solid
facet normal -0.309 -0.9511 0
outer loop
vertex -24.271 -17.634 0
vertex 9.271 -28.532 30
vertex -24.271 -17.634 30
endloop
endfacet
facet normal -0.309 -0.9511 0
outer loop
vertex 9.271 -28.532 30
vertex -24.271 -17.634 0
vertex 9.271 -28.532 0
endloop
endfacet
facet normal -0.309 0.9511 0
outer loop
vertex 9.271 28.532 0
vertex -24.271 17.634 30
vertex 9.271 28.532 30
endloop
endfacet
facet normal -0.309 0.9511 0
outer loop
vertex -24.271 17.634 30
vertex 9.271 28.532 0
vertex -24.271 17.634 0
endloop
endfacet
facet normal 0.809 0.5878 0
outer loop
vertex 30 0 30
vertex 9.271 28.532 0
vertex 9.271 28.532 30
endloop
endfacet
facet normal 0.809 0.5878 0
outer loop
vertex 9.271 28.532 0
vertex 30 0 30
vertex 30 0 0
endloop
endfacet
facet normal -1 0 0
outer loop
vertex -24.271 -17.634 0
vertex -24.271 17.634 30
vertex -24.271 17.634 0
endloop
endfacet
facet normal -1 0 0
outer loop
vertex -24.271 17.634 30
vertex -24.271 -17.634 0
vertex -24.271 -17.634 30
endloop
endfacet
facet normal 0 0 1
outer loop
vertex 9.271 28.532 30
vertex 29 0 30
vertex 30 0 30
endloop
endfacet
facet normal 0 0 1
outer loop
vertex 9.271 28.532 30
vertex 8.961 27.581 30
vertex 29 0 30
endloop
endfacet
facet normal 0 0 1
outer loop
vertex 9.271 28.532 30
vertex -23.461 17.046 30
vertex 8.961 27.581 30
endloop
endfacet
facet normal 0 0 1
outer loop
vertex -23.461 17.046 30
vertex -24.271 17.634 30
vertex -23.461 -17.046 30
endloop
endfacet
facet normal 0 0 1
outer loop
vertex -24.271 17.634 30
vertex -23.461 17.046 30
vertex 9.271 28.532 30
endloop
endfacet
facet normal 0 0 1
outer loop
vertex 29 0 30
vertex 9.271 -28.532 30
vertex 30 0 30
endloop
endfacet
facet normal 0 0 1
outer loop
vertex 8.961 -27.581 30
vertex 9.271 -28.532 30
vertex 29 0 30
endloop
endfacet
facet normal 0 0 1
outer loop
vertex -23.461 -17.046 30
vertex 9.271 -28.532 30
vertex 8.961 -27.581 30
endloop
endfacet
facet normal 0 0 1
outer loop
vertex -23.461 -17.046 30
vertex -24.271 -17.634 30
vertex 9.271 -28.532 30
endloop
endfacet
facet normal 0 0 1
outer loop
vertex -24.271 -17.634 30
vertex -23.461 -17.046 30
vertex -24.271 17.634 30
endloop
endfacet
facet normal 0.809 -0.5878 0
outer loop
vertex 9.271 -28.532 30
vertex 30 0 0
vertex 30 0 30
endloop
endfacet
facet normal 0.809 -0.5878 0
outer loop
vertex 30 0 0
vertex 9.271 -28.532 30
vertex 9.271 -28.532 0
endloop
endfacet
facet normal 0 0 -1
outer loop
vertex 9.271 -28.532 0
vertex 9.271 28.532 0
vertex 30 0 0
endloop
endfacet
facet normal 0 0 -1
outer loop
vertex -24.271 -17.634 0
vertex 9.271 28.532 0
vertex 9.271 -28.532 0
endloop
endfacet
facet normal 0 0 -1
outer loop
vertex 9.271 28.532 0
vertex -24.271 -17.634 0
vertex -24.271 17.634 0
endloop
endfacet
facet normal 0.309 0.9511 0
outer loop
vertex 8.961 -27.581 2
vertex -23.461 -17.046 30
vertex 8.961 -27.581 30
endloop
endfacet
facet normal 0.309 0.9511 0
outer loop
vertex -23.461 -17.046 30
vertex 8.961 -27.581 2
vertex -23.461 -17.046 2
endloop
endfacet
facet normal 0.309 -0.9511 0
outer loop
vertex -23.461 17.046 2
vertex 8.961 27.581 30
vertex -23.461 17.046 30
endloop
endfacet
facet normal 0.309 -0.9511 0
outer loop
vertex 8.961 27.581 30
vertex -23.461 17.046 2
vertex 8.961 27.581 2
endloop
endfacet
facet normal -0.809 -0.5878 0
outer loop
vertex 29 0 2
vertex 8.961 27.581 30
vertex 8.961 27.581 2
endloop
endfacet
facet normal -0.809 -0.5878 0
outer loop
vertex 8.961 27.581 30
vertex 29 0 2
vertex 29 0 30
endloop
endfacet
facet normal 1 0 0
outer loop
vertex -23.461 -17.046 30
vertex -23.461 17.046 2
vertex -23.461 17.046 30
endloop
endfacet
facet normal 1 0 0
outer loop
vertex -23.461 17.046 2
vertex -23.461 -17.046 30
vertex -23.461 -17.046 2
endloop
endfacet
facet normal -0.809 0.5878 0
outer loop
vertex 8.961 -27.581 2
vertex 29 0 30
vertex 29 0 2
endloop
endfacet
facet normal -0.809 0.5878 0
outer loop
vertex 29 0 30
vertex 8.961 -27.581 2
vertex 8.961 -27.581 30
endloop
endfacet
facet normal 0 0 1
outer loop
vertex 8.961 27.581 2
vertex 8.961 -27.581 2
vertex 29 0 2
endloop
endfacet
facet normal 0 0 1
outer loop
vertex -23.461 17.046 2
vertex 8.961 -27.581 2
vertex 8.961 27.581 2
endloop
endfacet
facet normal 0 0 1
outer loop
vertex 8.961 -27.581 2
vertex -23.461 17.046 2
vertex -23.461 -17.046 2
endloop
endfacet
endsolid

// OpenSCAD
// [FL_INDEX: keywords="openscad, 3d_parametric, Parametric_Simple_Cup_or_Vase, csg_solid" | COT="Parametric OpenSCAD design from 3DCodeverse"]
// Title: Parametric Simple Cup or Vase

// Simple Customizable Cup.

// By Donald E. King, 1/8/2013

// Written primarily to check out the Thingiverse.com Customizer feature.

// resolution of circles, cylinders and spheres
1_res = 5;  // [120, 60, 50, 40, 30, 20, 13, 12, 11, 10, 9, 8, 7, 6, 5, 4, 3]

// outside radius of cup
radius_1 = 30;

// height of cup
height_1 = 30;

// wall thickness (negative values produce a disc wthout walls)
t_wall = 1; //  [0.5, 1, 1.5, 2, 2.5, 3, 4, 5, -1]

// bottom thickness (negative values produce a hollow cylinder)
t_bottom = 2;  //  [0.5, 1, 1.5, 2, 2.5, 3, 4, 5, -1]


difference()
{

translate([0, 0, height_1/2])
cylinder(r = radius_1, h = height_1, center = true, $fn = 1_res);

translate([0, 0, t_bottom + 2*height_1/2])
cylinder(r = radius_1-t_wall, h = 2*height_1, center = true, $fn = 1_res);

}
